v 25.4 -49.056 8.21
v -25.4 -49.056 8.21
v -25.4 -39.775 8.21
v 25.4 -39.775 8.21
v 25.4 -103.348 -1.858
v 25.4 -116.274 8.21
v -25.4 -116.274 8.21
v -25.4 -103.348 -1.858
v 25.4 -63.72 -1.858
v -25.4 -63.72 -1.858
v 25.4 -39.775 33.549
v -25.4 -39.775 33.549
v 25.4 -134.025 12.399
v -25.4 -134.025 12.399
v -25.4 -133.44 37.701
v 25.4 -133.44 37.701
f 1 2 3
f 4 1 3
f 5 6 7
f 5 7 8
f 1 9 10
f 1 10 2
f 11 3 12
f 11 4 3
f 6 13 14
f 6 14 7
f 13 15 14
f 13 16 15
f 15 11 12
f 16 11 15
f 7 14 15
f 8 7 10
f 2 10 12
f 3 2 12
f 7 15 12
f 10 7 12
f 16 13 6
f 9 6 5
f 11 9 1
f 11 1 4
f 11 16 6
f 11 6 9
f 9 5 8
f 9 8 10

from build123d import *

# Parameters (mm, degrees)
F1_DEPTH = 25.4
F2_DEPTH = 25.4


with BuildPart() as f1:
    # F0 (on Right) → F1 (new body)
    with BuildSketch(Plane.YZ):
        Polygon((-133.440181613, 37.7011820674), (-134.0246200562, 12.3990774155), (-116.2741854787, 8.210147731), (-103.3477857709, -1.8578846939), (-63.7195706367, -1.8578846939), (-49.0556843579, 8.210147731), (-39.7747755051, 8.210147731), (-39.7747755051, 33.5487276316), align=None)
    extrude(amount=F1_DEPTH)

    # F2 (add): a face of the model
    f2_faces = [f1.faces().sort_by_distance(p)[0] for p in [
        (0, -86.6234005429, 18.8773491823),
    ]]
    extrude(f2_faces, amount=F2_DEPTH)


solid = f1.part
